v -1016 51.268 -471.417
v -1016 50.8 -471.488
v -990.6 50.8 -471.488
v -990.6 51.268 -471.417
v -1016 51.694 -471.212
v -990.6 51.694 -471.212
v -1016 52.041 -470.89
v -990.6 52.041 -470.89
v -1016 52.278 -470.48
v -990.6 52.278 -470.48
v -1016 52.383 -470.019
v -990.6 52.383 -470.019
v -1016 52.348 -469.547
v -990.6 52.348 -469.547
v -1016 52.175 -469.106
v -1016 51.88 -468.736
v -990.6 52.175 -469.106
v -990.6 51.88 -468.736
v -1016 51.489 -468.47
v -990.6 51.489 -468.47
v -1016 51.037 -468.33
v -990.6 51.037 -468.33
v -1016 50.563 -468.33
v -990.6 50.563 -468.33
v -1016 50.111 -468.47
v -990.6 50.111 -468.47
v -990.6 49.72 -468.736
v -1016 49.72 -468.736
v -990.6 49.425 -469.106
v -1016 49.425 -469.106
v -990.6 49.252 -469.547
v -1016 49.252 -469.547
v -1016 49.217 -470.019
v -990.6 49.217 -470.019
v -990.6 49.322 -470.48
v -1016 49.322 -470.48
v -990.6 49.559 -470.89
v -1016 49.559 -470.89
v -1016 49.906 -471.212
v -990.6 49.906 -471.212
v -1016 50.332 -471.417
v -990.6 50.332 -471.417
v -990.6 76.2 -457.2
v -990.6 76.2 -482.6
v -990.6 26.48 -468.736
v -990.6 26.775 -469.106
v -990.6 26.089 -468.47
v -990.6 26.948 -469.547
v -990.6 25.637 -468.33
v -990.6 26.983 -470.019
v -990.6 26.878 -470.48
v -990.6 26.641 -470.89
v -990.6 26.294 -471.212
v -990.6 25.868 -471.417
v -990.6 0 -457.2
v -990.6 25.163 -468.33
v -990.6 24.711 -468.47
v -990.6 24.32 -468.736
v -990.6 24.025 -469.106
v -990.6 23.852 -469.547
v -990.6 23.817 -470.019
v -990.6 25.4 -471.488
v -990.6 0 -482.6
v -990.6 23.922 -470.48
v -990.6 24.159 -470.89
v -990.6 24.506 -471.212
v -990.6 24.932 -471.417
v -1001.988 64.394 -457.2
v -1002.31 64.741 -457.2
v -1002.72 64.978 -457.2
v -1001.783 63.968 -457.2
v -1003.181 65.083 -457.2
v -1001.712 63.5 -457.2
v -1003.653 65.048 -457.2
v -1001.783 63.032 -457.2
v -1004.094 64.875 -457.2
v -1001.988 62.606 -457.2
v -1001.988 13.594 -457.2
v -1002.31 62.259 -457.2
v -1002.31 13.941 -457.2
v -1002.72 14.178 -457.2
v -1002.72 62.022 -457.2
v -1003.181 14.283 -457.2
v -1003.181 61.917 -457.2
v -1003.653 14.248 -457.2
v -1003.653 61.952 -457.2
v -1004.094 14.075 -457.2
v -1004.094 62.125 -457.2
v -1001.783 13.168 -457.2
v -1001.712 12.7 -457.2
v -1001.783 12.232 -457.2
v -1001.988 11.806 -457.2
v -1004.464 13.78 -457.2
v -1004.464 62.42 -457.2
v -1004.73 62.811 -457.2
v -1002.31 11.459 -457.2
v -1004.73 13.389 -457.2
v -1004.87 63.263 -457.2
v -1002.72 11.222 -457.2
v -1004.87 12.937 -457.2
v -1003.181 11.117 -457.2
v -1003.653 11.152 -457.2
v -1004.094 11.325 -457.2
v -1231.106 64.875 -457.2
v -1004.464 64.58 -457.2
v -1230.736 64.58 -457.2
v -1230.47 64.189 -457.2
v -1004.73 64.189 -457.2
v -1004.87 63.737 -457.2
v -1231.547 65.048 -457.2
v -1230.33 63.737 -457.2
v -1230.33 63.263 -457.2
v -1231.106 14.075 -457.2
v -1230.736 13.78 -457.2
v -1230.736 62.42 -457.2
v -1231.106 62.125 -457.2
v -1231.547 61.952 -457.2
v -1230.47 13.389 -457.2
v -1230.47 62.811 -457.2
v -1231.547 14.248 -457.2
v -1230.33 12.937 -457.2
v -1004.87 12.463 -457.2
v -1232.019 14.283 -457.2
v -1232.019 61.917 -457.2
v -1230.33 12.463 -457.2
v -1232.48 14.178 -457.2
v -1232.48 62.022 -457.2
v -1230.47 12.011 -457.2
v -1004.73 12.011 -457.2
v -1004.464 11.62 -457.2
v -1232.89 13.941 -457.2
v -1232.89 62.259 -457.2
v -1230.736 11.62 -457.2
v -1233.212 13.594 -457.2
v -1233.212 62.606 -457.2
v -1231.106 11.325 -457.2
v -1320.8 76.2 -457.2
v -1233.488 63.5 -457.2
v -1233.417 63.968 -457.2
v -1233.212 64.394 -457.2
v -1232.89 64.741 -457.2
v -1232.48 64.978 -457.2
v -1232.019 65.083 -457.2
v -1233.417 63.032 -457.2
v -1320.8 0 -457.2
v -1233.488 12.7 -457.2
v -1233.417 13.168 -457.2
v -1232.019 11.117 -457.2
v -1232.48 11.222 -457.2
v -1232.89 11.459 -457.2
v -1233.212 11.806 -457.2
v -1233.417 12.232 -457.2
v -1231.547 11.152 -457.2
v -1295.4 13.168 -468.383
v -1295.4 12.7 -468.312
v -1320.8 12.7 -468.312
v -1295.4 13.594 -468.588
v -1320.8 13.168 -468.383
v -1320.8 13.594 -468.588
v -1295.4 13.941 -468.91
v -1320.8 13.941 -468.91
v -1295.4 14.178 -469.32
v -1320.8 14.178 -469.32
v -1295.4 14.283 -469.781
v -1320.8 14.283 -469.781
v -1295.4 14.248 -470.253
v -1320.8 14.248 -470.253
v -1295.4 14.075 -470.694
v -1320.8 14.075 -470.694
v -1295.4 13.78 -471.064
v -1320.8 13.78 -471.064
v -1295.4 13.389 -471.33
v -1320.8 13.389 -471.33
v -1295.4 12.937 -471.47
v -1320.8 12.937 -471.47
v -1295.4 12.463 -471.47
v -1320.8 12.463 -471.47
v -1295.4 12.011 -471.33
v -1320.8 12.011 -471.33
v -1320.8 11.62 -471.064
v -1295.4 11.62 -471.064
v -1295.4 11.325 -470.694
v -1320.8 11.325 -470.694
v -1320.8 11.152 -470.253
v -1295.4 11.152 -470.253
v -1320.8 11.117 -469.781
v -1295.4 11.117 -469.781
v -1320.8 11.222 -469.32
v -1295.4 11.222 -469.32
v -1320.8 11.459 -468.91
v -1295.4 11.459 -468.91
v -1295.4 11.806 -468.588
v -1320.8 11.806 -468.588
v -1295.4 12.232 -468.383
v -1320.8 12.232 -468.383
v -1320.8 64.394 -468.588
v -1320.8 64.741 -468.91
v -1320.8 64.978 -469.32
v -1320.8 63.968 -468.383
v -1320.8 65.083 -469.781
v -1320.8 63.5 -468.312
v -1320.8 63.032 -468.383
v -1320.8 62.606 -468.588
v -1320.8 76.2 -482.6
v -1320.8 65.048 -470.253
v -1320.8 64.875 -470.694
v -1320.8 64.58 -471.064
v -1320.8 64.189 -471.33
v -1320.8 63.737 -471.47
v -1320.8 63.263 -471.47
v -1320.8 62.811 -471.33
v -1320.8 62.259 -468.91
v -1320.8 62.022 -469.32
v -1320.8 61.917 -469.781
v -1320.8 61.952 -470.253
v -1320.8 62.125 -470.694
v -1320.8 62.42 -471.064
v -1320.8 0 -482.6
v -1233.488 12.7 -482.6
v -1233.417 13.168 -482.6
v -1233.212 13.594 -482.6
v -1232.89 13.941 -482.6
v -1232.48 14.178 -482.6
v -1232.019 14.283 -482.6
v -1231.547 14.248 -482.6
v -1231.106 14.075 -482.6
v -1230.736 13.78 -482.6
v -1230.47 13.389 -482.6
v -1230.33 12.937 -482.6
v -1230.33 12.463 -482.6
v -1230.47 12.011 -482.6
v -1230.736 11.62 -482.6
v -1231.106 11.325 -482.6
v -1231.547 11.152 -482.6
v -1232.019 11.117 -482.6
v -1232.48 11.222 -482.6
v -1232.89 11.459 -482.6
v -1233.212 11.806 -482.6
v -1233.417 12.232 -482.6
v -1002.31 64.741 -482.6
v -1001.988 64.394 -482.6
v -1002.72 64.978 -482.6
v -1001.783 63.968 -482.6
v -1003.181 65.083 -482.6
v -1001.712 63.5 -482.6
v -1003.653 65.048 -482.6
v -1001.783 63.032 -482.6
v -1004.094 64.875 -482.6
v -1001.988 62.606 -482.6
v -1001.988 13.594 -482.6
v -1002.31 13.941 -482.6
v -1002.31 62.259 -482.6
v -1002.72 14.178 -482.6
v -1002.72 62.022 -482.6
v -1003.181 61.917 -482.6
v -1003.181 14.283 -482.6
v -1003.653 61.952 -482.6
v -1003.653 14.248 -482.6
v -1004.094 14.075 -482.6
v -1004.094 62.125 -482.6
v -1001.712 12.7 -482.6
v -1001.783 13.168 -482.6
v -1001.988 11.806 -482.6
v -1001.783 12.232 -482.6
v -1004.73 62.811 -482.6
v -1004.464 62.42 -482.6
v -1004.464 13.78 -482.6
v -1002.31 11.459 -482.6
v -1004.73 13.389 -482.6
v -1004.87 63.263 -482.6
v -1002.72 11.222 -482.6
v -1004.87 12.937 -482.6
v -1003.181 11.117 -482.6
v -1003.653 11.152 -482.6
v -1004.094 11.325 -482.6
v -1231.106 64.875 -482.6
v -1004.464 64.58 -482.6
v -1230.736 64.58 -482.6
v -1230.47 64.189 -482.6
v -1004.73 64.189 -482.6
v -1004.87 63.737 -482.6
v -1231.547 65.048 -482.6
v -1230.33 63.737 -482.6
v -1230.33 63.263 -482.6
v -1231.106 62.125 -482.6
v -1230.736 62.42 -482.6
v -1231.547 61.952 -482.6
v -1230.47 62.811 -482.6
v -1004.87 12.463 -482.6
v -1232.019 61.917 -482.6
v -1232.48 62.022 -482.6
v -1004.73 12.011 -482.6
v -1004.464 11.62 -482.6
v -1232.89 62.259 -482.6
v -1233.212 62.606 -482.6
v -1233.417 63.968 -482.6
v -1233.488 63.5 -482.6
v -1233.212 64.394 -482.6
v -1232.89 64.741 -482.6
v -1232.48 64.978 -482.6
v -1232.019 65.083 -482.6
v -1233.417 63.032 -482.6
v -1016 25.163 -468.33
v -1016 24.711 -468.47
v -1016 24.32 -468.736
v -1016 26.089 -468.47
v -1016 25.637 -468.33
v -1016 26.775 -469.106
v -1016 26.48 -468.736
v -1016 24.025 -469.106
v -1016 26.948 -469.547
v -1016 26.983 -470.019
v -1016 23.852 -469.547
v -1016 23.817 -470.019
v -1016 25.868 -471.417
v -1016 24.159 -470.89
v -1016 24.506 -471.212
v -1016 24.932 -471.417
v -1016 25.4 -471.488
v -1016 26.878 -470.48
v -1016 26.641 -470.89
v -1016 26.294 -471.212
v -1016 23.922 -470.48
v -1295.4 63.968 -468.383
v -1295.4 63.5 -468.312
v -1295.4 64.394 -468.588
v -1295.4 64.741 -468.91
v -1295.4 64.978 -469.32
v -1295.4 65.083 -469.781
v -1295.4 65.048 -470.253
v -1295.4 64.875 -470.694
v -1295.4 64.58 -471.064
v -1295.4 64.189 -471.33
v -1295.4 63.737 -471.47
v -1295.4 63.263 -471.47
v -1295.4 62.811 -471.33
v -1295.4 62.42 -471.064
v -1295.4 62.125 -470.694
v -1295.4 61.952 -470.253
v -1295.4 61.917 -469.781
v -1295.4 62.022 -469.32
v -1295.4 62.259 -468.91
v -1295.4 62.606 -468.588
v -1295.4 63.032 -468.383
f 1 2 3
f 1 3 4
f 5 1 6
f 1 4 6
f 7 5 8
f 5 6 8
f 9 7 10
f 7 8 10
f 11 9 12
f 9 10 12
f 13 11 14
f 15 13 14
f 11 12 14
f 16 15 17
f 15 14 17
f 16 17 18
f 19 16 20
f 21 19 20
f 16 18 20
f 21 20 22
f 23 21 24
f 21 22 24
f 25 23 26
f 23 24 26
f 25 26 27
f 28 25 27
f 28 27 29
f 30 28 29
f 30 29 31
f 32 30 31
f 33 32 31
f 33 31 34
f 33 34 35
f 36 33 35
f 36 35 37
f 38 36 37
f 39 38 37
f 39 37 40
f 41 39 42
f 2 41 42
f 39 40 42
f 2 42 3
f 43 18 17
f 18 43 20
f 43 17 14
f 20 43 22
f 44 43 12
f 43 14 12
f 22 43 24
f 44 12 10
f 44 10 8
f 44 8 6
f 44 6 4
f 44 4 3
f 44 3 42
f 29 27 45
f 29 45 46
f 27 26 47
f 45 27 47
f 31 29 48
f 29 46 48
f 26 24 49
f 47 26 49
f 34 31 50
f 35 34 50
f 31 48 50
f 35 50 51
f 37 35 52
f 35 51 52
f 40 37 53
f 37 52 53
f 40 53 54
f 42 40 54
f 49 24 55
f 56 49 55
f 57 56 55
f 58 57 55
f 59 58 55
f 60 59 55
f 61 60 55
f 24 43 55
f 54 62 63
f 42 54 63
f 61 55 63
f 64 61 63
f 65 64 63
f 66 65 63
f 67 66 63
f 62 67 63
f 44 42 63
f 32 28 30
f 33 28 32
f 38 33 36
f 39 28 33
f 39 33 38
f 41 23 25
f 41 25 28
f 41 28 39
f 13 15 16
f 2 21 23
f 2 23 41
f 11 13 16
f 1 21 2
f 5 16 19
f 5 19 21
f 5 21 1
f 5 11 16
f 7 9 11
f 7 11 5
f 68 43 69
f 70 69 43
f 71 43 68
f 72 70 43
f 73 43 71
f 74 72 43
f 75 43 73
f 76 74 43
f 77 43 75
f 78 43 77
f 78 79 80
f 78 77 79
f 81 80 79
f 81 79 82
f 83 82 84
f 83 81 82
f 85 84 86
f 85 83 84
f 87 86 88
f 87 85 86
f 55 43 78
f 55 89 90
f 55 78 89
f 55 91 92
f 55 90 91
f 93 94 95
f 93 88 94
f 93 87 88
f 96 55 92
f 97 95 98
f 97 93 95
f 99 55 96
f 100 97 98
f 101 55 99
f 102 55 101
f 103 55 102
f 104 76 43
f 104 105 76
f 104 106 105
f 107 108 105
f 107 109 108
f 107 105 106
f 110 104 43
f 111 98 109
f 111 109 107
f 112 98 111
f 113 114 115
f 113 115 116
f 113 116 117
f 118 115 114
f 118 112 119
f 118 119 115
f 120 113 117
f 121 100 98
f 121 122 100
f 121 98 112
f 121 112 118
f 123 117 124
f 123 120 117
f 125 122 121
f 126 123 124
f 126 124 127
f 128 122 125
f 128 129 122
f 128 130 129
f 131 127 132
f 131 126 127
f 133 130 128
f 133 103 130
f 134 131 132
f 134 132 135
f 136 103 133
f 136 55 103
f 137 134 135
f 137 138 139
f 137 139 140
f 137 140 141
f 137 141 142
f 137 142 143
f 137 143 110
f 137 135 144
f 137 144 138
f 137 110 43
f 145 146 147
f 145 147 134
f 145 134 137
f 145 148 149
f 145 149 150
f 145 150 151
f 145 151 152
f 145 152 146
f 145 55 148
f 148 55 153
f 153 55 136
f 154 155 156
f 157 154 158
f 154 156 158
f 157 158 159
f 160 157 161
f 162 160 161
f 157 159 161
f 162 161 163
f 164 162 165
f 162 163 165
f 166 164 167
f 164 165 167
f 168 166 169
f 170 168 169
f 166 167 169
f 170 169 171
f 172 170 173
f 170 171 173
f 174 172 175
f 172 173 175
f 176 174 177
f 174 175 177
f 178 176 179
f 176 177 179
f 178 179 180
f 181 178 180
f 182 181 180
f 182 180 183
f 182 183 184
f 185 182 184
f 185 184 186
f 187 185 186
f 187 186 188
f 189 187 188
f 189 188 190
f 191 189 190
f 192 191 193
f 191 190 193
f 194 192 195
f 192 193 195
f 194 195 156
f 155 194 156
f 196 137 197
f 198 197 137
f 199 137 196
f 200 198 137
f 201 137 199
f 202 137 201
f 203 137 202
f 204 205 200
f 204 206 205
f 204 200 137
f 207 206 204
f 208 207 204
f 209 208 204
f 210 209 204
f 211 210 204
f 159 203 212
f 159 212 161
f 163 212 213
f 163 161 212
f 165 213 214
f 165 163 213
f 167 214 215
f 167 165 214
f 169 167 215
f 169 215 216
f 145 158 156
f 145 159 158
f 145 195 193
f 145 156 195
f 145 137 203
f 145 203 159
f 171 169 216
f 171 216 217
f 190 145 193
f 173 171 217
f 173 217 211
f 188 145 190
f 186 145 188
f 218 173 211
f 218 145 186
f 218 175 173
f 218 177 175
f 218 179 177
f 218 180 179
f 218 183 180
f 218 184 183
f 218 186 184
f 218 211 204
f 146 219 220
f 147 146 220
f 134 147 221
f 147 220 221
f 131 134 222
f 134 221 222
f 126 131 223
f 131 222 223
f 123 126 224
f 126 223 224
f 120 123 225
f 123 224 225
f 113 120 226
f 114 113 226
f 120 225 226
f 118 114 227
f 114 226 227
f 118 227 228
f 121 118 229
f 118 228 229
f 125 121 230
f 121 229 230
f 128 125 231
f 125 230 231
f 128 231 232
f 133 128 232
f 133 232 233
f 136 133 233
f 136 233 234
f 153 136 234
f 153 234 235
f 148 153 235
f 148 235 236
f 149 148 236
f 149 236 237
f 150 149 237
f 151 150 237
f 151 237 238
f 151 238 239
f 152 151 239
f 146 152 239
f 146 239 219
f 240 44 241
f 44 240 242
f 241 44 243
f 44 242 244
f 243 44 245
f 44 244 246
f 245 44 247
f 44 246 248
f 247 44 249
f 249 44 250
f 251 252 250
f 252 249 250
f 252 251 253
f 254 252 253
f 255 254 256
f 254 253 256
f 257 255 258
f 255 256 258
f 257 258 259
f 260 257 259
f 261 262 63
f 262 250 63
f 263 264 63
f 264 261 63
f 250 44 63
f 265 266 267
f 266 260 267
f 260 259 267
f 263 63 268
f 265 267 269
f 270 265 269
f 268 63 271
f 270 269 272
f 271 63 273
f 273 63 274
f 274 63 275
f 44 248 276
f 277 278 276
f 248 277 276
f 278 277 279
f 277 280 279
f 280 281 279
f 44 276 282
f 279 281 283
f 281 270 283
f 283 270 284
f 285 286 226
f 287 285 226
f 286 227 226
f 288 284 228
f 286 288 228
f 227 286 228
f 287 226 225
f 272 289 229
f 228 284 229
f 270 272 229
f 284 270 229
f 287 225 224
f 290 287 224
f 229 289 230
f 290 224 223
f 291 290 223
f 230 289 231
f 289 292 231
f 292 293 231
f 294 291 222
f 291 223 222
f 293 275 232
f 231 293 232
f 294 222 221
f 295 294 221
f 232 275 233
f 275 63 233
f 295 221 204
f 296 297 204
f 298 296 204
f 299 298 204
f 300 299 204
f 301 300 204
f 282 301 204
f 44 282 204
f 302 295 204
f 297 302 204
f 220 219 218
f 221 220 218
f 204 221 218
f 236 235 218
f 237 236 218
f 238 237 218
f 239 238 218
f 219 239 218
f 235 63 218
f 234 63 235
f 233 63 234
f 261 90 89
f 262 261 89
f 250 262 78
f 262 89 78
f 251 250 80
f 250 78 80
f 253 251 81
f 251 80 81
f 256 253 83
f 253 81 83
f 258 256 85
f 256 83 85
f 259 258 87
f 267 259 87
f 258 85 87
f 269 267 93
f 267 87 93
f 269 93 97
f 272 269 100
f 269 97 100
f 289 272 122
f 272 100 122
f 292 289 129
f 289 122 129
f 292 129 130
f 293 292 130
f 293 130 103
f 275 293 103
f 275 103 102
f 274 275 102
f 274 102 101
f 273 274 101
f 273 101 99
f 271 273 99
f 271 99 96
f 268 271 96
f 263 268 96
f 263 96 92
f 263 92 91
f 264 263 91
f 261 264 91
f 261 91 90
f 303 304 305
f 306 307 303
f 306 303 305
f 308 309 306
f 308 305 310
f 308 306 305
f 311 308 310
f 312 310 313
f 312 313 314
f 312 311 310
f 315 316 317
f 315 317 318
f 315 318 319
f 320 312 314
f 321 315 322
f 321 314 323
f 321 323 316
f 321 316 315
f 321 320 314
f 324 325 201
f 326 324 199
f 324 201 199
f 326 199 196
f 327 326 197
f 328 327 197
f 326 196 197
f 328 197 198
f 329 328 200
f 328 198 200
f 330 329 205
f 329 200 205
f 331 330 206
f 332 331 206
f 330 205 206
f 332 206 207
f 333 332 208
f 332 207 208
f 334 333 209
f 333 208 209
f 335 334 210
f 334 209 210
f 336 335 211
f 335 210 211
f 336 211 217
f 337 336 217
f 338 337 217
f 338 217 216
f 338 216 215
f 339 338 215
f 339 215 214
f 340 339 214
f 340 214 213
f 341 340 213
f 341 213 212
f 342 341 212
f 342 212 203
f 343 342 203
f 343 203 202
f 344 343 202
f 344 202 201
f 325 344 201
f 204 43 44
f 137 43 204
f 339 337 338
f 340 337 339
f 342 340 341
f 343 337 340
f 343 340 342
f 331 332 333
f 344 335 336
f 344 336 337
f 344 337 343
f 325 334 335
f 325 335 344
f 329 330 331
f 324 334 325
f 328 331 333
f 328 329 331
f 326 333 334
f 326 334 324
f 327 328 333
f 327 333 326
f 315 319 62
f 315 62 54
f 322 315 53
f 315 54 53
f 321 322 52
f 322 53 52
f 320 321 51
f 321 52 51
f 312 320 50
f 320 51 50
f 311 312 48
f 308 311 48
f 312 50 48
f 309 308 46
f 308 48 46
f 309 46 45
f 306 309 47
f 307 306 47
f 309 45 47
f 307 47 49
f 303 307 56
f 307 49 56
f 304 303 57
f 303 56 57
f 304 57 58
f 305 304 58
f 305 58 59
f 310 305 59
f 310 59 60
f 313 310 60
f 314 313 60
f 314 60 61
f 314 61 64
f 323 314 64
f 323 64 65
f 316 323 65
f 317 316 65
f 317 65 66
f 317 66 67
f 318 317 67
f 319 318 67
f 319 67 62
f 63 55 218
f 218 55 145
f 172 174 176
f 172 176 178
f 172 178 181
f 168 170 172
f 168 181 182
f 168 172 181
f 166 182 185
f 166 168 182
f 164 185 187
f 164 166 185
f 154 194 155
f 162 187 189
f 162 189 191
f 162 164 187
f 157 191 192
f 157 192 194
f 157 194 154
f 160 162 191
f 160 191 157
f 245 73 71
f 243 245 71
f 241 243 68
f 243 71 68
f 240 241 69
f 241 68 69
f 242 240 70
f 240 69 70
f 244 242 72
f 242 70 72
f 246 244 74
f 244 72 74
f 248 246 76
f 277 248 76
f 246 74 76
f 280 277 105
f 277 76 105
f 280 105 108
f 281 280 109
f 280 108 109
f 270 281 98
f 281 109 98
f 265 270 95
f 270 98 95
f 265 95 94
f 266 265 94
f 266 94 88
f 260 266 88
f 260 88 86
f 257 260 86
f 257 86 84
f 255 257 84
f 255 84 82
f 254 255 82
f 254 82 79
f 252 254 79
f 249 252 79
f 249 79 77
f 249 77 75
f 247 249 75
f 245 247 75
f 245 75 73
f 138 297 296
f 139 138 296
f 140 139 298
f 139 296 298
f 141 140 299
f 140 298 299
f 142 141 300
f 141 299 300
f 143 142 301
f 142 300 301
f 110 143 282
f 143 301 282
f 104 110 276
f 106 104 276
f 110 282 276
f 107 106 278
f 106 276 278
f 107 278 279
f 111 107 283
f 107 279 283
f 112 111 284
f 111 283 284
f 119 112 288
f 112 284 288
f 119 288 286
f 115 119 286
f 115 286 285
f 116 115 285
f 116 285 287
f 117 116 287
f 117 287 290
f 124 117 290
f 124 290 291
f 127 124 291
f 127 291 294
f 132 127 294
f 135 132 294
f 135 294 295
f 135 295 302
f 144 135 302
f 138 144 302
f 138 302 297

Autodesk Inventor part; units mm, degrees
ref_plane "YZ Plane" through (0, 0, 0) normal (1, 0, 0) x (0, 1, 0)
ref_plane "XZ Plane" through (0, 0, 0) normal (0, 1, 0) x (-1, 0, 0)
ref_plane "XY Plane" through (0, 0, 0) normal (0, 0, 1) x (1, 0, 0)
sketch "Sketch1" plane through (0, 0, 0) normal (0, 1, 0) x (-1, 0, 0)
  line L0 (6.35, 0) -> (1365.25, 0)
  line L1 (1371.6, -6.35) -> (1371.6, -1365.25)
  line L2 (1365.25, -1371.6) -> (6.35, -1371.6)
  line L3 (0, -1365.25) -> (0, -6.35)
  line L4 (1346.2, -1346.2) -> (1346.2, -25.4)
  line L5 (1346.2, -25.4) -> (25.4, -25.4)
  line L6 (25.4, -25.4) -> (25.4, -1346.2)
  line L7 (25.4, -1346.2) -> (1346.2, -1346.2)
  line L8 (1320.8, -50.8) -> (1320.8, -1320.8)
  line L9 (1320.8, -1320.8) -> (50.8, -1320.8)
  line L10 (50.8, -1320.8) -> (50.8, -50.8)
  line L11 (50.8, -50.8) -> (1320.8, -50.8)
  line L12 (1320.8, -50.8) -> (1346.2, -25.4)
  line L13 (1320.8, -1320.8) -> (1346.2, -1346.2)
  line L14 (50.8, -1320.8) -> (25.4, -1346.2)
  line L15 (50.8, -50.8) -> (25.4, -25.4)
  line L16 (1219.2, -482.6) -> (1016, -482.6)
  line L17 (1016, -482.6) -> (1016, -889)
  line L18 (1016, -889) -> (1219.2, -889)
  line L19 (1219.2, -889) -> (1219.2, -482.6)
  line L20 (355.6, -482.6) -> (152.4, -482.6)
  line L21 (152.4, -482.6) -> (152.4, -889)
  line L22 (152.4, -889) -> (355.6, -889)
  line L23 (355.6, -889) -> (355.6, -482.6)
  line L24 (889, -1016) -> (482.6, -1016)
  line L25 (482.6, -1016) -> (482.6, -1219.2)
  line L26 (482.6, -1219.2) -> (889, -1219.2)
  line L27 (889, -1219.2) -> (889, -1016)
  line L28 (889, -152.4) -> (482.6, -152.4)
  line L29 (482.6, -152.4) -> (482.6, -355.6)
  line L30 (482.6, -355.6) -> (889, -355.6)
  line L31 (889, -355.6) -> (889, -152.4)
  circle A0 centre (685.8, -685.8) radius 254
  line L32 (889, -127) -> (482.6, -127)
  line L33 (457.2, -127) -> (457.2, -381)
  line L34 (457.2, -381) -> (914.4, -381)
  line L35 (914.4, -381) -> (914.4, -127)
  line L36 (1244.6, -457.2) -> (990.6, -457.2)
  line L37 (990.6, -457.2) -> (990.6, -914.4)
  line L38 (990.6, -914.4) -> (1244.6, -914.4)
  line L39 (1244.6, -889) -> (1244.6, -482.6)
  line L40 (914.4, -990.6) -> (457.2, -990.6)
  line L41 (457.2, -990.6) -> (457.2, -1244.6)
  line L42 (482.6, -1244.6) -> (889, -1244.6)
  line L43 (914.4, -1244.6) -> (914.4, -990.6)
  line L44 (381, -457.2) -> (127, -457.2)
  line L45 (127, -482.6) -> (127, -889)
  line L46 (127, -914.4) -> (381, -914.4)
  line L47 (381, -914.4) -> (381, -457.2)
  line L48 (152.4, -482.6) -> (50.8, -482.6)
  line L49 (127, -457.2) -> (50.8, -457.2)
  line L50 (152.4, -889) -> (50.8, -889)
  line L51 (127, -914.4) -> (50.8, -914.4)
  line L52 (355.6, -889) -> (381, -889)
  line L53 (355.6, -482.6) -> (381, -482.6)
  line L54 (457.2, -1244.6) -> (457.2, -1320.8)
  line L55 (482.6, -1219.2) -> (482.6, -1320.8)
  line L56 (889, -1219.2) -> (889, -1320.8)
  line L57 (914.4, -1244.6) -> (914.4, -1320.8)
  line L58 (1244.6, -914.4) -> (1320.8, -914.4)
  line L59 (1219.2, -889) -> (1320.8, -889)
  line L60 (1219.2, -482.6) -> (1320.8, -482.6)
  line L61 (1244.6, -457.2) -> (1320.8, -457.2)
  line L62 (889, -152.4) -> (889, -50.8)
  line L63 (914.4, -127) -> (914.4, -50.8)
  line L64 (482.6, -152.4) -> (482.6, -50.8)
  line L65 (457.2, -127) -> (457.2, -50.8)
  line L66 (889, -1016) -> (889, -990.6)
  line L67 (482.6, -1016) -> (482.6, -990.6)
  line L68 (1016, -889) -> (990.6, -889)
  line L69 (1016, -482.6) -> (990.6, -482.6)
  line L70 (889, -355.6) -> (889, -381)
  line L71 (482.6, -355.6) -> (482.6, -381)
  line L72 (914.4, -381) -> (990.6, -457.2)
  line L73 (990.6, -482.6) -> (889, -381)
  line L74 (990.6, -914.4) -> (914.4, -990.6)
  line L75 (889, -990.6) -> (990.6, -889)
  line L76 (381, -914.4) -> (457.2, -990.6)
  line L77 (482.6, -990.6) -> (381, -889)
  line L78 (457.2, -381) -> (381, -457.2)
  line L79 (482.6, -381) -> (381, -482.6)
  line L80 (1257.3, -50.8) -> (1320.8, -114.3)
  line L81 (1320.8, -1257.3) -> (1257.3, -1320.8)
  line L82 (50.8, -1257.3) -> (114.3, -1320.8)
  line L83 (50.8, -114.3) -> (114.3, -50.8)
  line L84 (68.7605, -132.2605) -> (132.2605, -68.7605)
  line L85 (68.7605, -1239.3395) -> (132.2605, -1302.8395)
  line L86 (1302.8395, -1239.3395) -> (1239.3395, -1302.8395)
  line L87 (1239.3395, -68.7605) -> (1302.8395, -132.2605)
  line L88 (1302.8395, -132.2605) -> (1320.8, -150.221)
  line L89 (1239.3395, -68.7605) -> (1221.379, -50.8)
  line L90 (1302.8395, -1239.3395) -> (1320.8, -1221.379)
  line L91 (1239.3395, -1302.8395) -> (1221.379, -1320.8)
  line L92 (132.2605, -1302.8395) -> (150.221, -1320.8)
  line L93 (68.7605, -1239.3395) -> (50.8, -1221.379)
  line L94 (132.2605, -68.7605) -> (150.221, -50.8)
  line L95 (68.7605, -132.2605) -> (50.8, -150.221)
  line L96 (1365.25, 0) -> (1371.6, -6.35)
  line L97 (1371.6, -1365.25) -> (1365.25, -1371.6)
  line L98 (6.35, -1371.6) -> (0, -1365.25)
  line L99 (6.35, 0) -> (0, -6.35)
  point P0 (0, 0)
  point P1 (1371.6, -1371.6)
  point P2 (1371.6, 0)
  point P3 (0, -1371.6)
  dimension "d0" = 1371.6
  dimension "d1" = 1371.6
  dimension "d2" = 25.4
  dimension "d3" = 25.4
  dimension "d4" = 203.2
  dimension "d5" = 406.4
  dimension "d6" = 203.2
  dimension "d7" = 406.4
  dimension "d8" = 406.4
  dimension "d9" = 203.2
  dimension "d10" = 406.4
  dimension "d11" = 203.2
  dimension "d12" = 101.6
  dimension "d13" = 101.6
  dimension "d14" = 101.6
  dimension "d15" = 101.6
  dimension "d16" = 431.8
  dimension "d17" = 431.8
  dimension "d18" = 431.8
  dimension "d19" = 431.8
  dimension "d20" = 508
  dimension "d21" = 25.4
  dimension "d22" = 25.4
  dimension "d23" = 25.4
  dimension "d24" = 25.4
  dimension "d25" = 45
  dimension "d26" = 63.5
  dimension "d27" = 45
  dimension "d28" = 45
  dimension "d29" = 45
  dimension "d30" = 25.4
  dimension "d31" = 25.4
  dimension "d32" = 25.4
  dimension "d33" = 25.4
  dimension "d34" = 6.35
  dimension "d35" = 6.35
  dimension "d36" = 6.35
  dimension "d37" = 6.35
  dimension "d38" = 6.35
  dimension "d39" = 6.35
  dimension "d40" = 6.35
  dimension "d41" = 6.35
extrude "Extrusion1" add sketch "Sketch1" along normal blind 76.2 contours L8 L60 L16 L69 L37 L36 L61
sketch "Sketch2" plane through (-1320.8, 0, -482.6) normal (-1, 0, 0) x (0, 0, 1)
  circle A0 centre (12.7, 12.7) radius 1.5875
  circle A1 centre (12.7, 63.5) radius 1.5875
  line L0 (0, 0) -> (0, 76.2) projected
  line L1 (0, 76.2) -> (25.4, 76.2) projected
  line L2 (0, 0) -> (25.4, 0) projected
  point P0 (482.6, 0)
  dimension "d44" = 3.175
  dimension "d45" = 3.175
  dimension "d46" = 12.7
  dimension "d47" = 12.7
  dimension "d48" = 12.7
  dimension "d49" = 12.7
extrude "Extrusion2" cut sketch "Sketch2" against normal blind 25.4
sketch "Sketch3" plane through (-1320.8, 0, -457.2) normal (0, 0, 1) x (1, 0, 0)
  circle A0 centre (317.5, 63.5) radius 1.5875
  circle A1 centre (317.5, 12.7) radius 1.5875
  line L0 (330.2, 0) -> (330.2, 76.2) projected
  line L1 (0, 76.2) -> (330.2, 76.2) projected
  line L2 (0, 0) -> (330.2, 0) projected
  point P0 (1320.8, 0)
  dimension "d52" = 3.175
  dimension "d53" = 3.175
  dimension "d54" = 12.7
  dimension "d55" = 12.7
  dimension "d56" = 12.7
  dimension "d57" = 12.7
extrude "Extrusion3" cut sketch "Sketch3" against normal blind 50.8
sketch "Sketch4" plane through (-990.6, 0, -457.2) normal (1, 0, 0) x (0, 0, -1)
  circle A0 centre (12.7, 50.8) radius 1.5875
  circle A1 centre (12.7, 25.4) radius 1.5875
  line L0 (25.4, 0) -> (25.4, 76.2) projected
  line L1 (0, 0) -> (25.4, 0) projected
  line L2 (0, 76.2) -> (25.4, 76.2) projected
  point P0 (-457.2, 0)
  dimension "d60" = 3.175
  dimension "d61" = 3.175
  dimension "d62" = 12.7
  dimension "d63" = 12.7
  dimension "d64" = 25.4
  dimension "d65" = 25.4
extrude "Extrusion4" cut sketch "Sketch4" against normal blind 25.4
sketch "Sketch5" plane through (-990.6, 0, -482.6) normal (0, 0, -1) x (-1, 0, 0)
  line L0 (228.6, 0) -> (228.6, 76.2)
  line L1 (0, 76.2) -> (330.2, 76.2) projected
  line L2 (254, 0) -> (254, 76.2)
  circle A0 centre (241.3, 63.5) radius 1.5875
  circle A1 centre (241.3, 12.7) radius 1.5875
  line L3 (0, 0) -> (330.2, 0) projected
  point P0 (-990.6, 0)
  point P1 (228.6, 0)
  point P2 (254, 0)
  dimension "d68" = 3.175
  dimension "d69" = 3.175
  dimension "d70" = 12.7
  dimension "d71" = 12.7
  dimension "d72" = 12.7
  dimension "d73" = 12.7
extrude "Extrusion5" cut sketch "Sketch5" against normal blind 76.2 contours A0 | A1
equation "\"d35\" = d34"
equation "\"d36\" = d34"
equation "\"d37\" = d36"
equation "\"d38\" = d34"
equation "\"d39\" = d38"
equation "\"d40\" = d34"
equation "\"d41\" = d40"
properties part number "Secondary frame for drawrs long piece X8"
